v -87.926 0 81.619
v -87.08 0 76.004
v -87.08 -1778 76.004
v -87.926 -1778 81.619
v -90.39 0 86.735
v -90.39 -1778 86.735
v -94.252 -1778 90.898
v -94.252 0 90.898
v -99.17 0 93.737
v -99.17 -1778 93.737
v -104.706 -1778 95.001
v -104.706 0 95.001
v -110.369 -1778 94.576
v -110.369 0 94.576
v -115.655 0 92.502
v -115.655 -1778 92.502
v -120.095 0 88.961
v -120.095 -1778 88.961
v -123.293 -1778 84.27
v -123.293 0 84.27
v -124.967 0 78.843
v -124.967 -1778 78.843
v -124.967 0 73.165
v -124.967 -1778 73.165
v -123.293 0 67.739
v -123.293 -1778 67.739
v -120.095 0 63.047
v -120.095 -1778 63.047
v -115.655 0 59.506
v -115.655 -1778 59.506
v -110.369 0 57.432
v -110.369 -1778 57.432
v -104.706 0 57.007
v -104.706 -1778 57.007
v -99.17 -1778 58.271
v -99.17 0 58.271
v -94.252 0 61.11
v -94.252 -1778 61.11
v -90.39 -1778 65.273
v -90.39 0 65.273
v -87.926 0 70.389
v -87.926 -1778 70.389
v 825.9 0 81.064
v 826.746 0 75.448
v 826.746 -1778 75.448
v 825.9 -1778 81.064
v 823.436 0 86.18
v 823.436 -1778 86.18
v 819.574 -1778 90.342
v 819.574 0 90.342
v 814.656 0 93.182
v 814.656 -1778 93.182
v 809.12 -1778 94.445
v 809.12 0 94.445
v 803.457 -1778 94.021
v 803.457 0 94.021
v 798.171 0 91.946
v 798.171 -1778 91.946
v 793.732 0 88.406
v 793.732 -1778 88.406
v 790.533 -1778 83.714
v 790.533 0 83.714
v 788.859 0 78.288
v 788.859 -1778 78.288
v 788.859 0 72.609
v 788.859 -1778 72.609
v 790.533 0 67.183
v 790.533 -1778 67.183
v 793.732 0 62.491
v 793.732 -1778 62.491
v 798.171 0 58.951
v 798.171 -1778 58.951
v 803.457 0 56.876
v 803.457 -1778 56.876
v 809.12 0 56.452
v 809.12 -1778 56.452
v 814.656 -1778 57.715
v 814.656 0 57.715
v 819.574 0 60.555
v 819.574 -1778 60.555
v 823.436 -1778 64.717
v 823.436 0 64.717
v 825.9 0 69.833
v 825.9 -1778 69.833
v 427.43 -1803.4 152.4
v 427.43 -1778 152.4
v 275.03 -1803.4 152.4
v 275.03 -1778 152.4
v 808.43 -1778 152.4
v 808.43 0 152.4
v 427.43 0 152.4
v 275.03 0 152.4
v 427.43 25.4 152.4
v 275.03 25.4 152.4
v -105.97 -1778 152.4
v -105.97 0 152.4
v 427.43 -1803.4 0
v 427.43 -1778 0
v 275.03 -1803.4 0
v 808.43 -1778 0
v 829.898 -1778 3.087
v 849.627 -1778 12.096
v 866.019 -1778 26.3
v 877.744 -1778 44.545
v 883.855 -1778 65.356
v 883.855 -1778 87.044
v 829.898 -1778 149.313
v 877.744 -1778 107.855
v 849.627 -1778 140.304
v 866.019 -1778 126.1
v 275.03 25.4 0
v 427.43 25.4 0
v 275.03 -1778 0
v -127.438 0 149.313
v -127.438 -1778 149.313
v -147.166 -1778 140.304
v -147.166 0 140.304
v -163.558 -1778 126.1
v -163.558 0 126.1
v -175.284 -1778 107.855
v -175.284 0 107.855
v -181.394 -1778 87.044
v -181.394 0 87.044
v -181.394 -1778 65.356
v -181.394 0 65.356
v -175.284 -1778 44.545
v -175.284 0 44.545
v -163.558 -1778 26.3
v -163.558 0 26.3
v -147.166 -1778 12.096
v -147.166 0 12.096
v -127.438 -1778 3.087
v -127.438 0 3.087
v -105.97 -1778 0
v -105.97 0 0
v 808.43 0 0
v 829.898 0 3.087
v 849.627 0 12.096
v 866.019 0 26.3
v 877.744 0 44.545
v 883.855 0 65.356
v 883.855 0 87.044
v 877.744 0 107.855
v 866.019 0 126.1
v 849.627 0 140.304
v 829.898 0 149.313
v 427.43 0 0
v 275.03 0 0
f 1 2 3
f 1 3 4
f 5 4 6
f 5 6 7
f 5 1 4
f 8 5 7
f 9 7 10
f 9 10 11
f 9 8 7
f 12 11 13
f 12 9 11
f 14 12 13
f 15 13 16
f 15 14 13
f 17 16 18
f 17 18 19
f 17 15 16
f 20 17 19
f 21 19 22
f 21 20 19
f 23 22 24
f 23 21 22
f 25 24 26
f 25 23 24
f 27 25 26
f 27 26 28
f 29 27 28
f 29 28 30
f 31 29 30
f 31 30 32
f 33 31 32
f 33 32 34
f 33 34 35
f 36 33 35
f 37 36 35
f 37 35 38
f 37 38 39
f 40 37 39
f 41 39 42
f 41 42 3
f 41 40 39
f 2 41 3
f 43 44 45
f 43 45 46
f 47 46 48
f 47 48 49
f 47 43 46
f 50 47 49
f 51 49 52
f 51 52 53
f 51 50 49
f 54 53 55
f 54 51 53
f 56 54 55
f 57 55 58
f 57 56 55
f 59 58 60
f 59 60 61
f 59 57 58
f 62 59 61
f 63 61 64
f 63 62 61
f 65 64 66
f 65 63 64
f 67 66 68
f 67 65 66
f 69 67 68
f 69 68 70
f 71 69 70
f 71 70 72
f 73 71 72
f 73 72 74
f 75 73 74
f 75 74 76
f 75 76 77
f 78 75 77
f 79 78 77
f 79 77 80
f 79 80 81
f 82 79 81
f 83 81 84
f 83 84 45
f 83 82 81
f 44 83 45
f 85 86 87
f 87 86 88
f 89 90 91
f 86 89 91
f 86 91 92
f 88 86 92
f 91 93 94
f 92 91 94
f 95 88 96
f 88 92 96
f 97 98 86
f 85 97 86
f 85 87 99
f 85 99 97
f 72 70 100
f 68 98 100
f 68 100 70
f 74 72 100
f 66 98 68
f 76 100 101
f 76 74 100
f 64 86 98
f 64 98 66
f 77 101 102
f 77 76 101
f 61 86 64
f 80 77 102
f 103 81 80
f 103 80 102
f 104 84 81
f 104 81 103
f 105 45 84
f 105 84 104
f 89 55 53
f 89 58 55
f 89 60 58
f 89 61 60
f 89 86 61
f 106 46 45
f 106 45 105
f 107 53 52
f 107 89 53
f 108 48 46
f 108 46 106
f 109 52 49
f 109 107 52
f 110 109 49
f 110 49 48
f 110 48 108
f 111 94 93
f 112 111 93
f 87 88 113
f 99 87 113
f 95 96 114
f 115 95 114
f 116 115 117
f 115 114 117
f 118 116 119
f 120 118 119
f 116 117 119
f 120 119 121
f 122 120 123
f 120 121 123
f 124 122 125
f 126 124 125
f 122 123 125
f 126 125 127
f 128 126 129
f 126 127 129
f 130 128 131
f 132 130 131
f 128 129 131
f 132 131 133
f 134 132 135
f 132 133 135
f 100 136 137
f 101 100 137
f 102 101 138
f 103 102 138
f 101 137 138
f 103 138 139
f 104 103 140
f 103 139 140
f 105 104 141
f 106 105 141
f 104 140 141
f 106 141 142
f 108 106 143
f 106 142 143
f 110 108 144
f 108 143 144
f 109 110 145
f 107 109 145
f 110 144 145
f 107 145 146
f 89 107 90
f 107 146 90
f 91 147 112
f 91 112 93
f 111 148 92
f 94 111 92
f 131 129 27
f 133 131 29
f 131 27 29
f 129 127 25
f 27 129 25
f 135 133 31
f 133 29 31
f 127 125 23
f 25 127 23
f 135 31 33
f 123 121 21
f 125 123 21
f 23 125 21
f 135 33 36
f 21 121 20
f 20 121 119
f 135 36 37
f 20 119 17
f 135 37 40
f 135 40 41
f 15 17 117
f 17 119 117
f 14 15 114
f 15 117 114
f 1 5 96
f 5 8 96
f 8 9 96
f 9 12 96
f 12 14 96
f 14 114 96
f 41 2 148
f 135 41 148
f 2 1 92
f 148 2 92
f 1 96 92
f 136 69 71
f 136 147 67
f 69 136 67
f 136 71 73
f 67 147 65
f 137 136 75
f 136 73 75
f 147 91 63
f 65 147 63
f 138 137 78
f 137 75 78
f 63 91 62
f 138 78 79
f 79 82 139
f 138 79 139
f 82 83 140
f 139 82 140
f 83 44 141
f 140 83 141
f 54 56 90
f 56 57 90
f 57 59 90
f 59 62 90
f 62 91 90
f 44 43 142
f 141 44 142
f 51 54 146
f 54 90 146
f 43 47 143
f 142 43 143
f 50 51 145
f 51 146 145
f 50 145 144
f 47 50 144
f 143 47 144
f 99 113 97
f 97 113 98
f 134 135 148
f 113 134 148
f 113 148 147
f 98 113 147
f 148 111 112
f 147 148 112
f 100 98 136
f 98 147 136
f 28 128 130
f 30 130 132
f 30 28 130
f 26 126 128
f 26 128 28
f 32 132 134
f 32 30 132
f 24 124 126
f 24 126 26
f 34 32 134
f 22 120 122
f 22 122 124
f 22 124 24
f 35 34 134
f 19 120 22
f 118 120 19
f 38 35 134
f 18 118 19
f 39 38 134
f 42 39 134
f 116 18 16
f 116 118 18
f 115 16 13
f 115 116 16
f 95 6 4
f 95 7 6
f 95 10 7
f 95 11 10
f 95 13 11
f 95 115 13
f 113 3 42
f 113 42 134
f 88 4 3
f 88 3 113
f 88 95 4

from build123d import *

# Parameters (mm, degrees)
F1_R     = 19.05
F2_DEPTH = 1778
F4_DEPTH = 25.4
F5_W     = 152.4
F5_H     = 152.4
F6_DEPTH = 25.4


with BuildPart() as f2:
    # F1 (on face) → F2 (new body)
    with BuildSketch(Plane.XZ):
        with BuildLine():
            ThreePointArc((808.430407, 0), (884.630407, 76.2), (808.430407, 152.4))
            Line((808.430407, 152.4), (-105.969593, 152.4))
            ThreePointArc((-105.969593, 152.4), (-182.169593, 76.2), (-105.969593, 0))
            Line((-105.969593, 0), (808.430407, 0))
        make_face()
        with Locations((-106.129967, 76.004088)):
            Circle(F1_R, mode=Mode.SUBTRACT)
        with Locations((807.696342, 75.448431)):
            Circle(F1_R, mode=Mode.SUBTRACT)
    extrude(amount=F2_DEPTH)

    # F3 (on face) → F4 (join)
    with BuildSketch(Plane.XZ.offset(1778)):
        Polygon((427.430407, 152.4), (351.230407, 152.4), (275.030407, 152.4), (275.030407, 0), (427.430407, 0), align=None)
    extrude(amount=F4_DEPTH)

    # F5 (on face) → F6 (join)
    with BuildSketch(Plane.XZ):
        with Locations((351.230407, 76.2)):
            Rectangle(F5_W, F5_H)
    extrude(amount=-F6_DEPTH)


solid = f2.part
